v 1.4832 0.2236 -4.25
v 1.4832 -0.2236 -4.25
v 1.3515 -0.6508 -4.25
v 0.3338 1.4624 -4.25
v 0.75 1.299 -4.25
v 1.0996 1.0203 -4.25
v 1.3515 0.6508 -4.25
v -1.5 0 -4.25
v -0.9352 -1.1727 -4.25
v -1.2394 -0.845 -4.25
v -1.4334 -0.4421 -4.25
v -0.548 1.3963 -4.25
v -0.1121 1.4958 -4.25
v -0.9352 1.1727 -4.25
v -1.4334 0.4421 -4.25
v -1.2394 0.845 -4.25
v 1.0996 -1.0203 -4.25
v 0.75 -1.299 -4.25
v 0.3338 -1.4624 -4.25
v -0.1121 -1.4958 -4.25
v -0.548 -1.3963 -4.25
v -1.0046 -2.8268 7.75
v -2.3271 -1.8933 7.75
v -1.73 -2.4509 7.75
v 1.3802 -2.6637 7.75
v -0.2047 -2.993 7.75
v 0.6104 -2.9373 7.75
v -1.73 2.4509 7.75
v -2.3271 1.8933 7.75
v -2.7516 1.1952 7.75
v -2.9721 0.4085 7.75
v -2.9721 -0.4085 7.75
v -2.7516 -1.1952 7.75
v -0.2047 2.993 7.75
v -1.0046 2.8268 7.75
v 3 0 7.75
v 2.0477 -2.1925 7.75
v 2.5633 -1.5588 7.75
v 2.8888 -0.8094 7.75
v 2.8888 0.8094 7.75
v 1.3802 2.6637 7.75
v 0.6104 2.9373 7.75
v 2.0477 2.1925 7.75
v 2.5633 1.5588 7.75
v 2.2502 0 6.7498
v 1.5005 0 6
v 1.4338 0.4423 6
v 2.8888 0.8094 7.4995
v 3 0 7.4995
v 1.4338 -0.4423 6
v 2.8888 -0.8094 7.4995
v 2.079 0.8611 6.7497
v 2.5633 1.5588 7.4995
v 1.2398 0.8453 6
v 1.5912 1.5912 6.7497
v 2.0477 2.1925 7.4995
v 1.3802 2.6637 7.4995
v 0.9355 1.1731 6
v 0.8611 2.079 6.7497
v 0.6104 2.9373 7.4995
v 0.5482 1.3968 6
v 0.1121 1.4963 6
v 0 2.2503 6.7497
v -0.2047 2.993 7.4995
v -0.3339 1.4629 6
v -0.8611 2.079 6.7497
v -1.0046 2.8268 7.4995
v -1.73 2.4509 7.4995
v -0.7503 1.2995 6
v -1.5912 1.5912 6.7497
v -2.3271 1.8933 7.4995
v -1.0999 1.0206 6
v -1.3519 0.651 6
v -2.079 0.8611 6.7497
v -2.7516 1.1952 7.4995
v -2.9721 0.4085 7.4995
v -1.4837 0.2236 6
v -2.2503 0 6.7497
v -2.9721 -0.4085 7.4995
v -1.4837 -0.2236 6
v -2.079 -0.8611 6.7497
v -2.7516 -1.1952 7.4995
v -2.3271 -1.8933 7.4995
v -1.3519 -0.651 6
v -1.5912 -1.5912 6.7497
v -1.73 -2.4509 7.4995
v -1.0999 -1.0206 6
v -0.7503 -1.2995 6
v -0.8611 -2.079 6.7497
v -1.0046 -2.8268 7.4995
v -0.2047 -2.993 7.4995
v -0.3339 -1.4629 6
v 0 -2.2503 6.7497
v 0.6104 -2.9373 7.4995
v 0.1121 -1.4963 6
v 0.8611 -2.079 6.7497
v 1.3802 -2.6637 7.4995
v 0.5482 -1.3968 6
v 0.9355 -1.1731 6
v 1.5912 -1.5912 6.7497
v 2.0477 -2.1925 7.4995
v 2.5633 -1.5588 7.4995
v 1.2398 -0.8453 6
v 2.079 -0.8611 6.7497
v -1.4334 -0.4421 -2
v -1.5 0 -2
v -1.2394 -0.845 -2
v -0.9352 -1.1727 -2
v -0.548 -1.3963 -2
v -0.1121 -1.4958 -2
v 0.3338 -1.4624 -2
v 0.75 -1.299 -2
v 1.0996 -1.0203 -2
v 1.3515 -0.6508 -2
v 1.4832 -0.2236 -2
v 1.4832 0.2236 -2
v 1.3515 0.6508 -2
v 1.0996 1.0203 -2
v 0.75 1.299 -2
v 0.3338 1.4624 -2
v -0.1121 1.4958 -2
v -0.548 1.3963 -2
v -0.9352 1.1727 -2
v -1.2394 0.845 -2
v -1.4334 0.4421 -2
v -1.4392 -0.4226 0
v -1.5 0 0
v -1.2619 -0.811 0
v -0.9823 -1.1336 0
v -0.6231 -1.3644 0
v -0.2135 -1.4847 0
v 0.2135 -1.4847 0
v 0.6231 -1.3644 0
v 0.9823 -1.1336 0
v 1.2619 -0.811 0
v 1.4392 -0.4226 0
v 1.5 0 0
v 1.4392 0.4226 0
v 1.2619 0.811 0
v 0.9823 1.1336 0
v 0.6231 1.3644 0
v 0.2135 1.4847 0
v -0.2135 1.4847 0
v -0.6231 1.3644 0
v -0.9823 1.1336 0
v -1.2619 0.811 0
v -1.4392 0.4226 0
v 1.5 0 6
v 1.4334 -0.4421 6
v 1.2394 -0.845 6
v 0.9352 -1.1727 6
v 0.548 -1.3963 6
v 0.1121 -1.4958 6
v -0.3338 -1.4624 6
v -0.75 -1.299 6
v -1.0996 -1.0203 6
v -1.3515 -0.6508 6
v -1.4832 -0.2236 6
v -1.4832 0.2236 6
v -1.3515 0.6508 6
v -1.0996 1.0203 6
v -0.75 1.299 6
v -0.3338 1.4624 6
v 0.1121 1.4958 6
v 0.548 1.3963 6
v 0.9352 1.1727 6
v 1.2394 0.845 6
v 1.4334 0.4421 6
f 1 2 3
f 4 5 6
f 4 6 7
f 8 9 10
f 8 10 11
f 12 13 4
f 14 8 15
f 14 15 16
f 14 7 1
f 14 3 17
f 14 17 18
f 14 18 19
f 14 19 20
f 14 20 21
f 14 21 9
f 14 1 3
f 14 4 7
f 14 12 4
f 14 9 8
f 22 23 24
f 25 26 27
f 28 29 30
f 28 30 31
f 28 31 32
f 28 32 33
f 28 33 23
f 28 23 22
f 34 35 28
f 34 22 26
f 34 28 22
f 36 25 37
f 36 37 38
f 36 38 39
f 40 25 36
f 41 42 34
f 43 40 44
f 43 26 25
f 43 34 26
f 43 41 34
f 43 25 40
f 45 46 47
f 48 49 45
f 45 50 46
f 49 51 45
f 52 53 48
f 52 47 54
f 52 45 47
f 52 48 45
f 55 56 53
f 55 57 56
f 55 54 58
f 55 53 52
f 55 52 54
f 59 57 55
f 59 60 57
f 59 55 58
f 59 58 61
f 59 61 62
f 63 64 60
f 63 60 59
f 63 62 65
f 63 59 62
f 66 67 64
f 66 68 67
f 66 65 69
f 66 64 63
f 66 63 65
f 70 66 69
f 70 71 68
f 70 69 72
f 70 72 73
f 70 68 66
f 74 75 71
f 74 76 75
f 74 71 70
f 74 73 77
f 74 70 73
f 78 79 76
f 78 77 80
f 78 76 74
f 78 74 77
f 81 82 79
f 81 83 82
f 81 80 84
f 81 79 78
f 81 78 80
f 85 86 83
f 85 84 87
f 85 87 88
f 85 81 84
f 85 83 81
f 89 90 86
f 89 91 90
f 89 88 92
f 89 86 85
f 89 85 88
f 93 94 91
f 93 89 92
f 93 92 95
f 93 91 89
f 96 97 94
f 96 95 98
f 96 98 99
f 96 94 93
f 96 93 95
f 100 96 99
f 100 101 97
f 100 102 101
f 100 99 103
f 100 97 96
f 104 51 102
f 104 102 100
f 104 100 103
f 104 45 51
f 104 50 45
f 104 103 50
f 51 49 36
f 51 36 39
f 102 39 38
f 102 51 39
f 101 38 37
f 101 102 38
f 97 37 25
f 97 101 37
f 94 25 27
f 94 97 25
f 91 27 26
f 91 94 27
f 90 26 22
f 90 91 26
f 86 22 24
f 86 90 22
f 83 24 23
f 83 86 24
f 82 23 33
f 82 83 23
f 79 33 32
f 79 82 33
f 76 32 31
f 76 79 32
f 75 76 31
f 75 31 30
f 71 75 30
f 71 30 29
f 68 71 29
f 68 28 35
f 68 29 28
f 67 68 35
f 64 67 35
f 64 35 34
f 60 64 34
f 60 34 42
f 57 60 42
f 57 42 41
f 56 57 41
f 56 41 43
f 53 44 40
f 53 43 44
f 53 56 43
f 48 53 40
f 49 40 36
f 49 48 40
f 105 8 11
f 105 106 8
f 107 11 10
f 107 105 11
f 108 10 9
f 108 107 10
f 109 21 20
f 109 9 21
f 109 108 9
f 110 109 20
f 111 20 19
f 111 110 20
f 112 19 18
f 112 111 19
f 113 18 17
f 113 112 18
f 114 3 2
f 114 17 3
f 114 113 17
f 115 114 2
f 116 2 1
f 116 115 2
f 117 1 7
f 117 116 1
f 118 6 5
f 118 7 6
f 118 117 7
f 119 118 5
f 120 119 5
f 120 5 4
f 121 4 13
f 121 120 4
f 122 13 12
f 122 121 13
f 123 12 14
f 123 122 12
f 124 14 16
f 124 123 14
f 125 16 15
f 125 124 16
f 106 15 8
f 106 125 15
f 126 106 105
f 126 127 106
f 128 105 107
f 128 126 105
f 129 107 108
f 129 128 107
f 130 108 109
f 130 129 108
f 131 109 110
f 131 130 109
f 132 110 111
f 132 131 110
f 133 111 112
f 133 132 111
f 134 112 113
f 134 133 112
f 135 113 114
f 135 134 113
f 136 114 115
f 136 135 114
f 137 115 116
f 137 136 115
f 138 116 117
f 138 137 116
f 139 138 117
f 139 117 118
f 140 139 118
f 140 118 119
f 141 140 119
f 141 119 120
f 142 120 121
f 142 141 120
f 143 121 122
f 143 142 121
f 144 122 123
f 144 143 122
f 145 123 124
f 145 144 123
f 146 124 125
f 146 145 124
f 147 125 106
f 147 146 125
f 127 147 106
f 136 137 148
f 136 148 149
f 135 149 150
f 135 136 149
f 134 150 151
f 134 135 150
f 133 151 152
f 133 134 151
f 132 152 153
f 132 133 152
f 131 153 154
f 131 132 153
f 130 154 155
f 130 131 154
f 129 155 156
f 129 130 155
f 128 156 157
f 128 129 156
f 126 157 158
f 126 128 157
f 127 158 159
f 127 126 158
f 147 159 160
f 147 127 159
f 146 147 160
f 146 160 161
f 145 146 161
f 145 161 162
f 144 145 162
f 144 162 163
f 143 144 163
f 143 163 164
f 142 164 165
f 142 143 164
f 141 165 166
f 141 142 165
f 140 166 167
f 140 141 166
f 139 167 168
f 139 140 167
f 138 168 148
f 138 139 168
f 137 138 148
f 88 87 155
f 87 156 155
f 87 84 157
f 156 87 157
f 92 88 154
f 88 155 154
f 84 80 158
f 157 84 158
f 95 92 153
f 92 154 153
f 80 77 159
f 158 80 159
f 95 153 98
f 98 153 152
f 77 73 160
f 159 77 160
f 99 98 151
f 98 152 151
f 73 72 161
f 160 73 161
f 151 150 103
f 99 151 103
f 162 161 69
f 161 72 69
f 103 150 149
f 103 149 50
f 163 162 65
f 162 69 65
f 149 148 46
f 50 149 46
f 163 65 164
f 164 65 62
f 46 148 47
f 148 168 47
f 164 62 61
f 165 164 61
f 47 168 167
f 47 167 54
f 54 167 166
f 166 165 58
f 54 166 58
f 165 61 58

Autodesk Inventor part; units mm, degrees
ref_plane "YZ Plane" through (0, 0, 0) normal (1, 0, 0) x (0, 1, 0)
ref_plane "XZ Plane" through (0, 0, 0) normal (0, 1, 0) x (-1, 0, 0)
ref_plane "XY Plane" through (0, 0, 0) normal (0, 0, 1) x (1, 0, 0)
sketch "スケッチ1" plane through (0, 0, 0) normal (0, 0, 1) x (1, 0, 0)
  circle A0 centre (0, 0) radius 1.5
  dimension "d0" = 3
extrude "押し出し1" add sketch "スケッチ1" along normal blind 6
sketch "スケッチ2" plane through (0, 0, 6) normal (0, 0, 1) x (1, 0, 0)
  circle A0 centre (0, 0) radius 1.5 projected
  circle A1 centre (0, 0) radius 3
  dimension "d3" = 6
extrude "押し出し2" add sketch "スケッチ2" along normal blind 1.75 contours A0 | A1
thread "ねじ1" size "M3x0.5" class "6g" standard "ANSI Metric M Profile" full length
chamfer "面取り1" distance 1.5 angle 45 1 edges at (-3, 0, 6)
sketch "スケッチ4" plane through (0, 0, 0) normal (0, 0, -1) x (-1, 0, 0)
  circle A0 centre (0, 0) radius 1.5 projected
extrude "押し出し4" add sketch "スケッチ4" along normal blind 4
sketch "スケッチ5" plane through (0, 0, -4) normal (0, 0, -1) x (-1, 0, 0)
  circle A0 centre (0, 0) radius 1.5 projected
extrude "押し出し5" cut sketch "スケッチ5" against normal blind 2
sketch "スケッチ6" plane through (0, 0, -2) normal (0, 0, -1) x (-1, 0, 0)
  circle A0 centre (0, 0) radius 1.5 projected
extrude "押し出し6" add sketch "スケッチ6" along normal blind 2.25
properties part number "SB　12mm皿ネジ" material "Steel, Mild"
